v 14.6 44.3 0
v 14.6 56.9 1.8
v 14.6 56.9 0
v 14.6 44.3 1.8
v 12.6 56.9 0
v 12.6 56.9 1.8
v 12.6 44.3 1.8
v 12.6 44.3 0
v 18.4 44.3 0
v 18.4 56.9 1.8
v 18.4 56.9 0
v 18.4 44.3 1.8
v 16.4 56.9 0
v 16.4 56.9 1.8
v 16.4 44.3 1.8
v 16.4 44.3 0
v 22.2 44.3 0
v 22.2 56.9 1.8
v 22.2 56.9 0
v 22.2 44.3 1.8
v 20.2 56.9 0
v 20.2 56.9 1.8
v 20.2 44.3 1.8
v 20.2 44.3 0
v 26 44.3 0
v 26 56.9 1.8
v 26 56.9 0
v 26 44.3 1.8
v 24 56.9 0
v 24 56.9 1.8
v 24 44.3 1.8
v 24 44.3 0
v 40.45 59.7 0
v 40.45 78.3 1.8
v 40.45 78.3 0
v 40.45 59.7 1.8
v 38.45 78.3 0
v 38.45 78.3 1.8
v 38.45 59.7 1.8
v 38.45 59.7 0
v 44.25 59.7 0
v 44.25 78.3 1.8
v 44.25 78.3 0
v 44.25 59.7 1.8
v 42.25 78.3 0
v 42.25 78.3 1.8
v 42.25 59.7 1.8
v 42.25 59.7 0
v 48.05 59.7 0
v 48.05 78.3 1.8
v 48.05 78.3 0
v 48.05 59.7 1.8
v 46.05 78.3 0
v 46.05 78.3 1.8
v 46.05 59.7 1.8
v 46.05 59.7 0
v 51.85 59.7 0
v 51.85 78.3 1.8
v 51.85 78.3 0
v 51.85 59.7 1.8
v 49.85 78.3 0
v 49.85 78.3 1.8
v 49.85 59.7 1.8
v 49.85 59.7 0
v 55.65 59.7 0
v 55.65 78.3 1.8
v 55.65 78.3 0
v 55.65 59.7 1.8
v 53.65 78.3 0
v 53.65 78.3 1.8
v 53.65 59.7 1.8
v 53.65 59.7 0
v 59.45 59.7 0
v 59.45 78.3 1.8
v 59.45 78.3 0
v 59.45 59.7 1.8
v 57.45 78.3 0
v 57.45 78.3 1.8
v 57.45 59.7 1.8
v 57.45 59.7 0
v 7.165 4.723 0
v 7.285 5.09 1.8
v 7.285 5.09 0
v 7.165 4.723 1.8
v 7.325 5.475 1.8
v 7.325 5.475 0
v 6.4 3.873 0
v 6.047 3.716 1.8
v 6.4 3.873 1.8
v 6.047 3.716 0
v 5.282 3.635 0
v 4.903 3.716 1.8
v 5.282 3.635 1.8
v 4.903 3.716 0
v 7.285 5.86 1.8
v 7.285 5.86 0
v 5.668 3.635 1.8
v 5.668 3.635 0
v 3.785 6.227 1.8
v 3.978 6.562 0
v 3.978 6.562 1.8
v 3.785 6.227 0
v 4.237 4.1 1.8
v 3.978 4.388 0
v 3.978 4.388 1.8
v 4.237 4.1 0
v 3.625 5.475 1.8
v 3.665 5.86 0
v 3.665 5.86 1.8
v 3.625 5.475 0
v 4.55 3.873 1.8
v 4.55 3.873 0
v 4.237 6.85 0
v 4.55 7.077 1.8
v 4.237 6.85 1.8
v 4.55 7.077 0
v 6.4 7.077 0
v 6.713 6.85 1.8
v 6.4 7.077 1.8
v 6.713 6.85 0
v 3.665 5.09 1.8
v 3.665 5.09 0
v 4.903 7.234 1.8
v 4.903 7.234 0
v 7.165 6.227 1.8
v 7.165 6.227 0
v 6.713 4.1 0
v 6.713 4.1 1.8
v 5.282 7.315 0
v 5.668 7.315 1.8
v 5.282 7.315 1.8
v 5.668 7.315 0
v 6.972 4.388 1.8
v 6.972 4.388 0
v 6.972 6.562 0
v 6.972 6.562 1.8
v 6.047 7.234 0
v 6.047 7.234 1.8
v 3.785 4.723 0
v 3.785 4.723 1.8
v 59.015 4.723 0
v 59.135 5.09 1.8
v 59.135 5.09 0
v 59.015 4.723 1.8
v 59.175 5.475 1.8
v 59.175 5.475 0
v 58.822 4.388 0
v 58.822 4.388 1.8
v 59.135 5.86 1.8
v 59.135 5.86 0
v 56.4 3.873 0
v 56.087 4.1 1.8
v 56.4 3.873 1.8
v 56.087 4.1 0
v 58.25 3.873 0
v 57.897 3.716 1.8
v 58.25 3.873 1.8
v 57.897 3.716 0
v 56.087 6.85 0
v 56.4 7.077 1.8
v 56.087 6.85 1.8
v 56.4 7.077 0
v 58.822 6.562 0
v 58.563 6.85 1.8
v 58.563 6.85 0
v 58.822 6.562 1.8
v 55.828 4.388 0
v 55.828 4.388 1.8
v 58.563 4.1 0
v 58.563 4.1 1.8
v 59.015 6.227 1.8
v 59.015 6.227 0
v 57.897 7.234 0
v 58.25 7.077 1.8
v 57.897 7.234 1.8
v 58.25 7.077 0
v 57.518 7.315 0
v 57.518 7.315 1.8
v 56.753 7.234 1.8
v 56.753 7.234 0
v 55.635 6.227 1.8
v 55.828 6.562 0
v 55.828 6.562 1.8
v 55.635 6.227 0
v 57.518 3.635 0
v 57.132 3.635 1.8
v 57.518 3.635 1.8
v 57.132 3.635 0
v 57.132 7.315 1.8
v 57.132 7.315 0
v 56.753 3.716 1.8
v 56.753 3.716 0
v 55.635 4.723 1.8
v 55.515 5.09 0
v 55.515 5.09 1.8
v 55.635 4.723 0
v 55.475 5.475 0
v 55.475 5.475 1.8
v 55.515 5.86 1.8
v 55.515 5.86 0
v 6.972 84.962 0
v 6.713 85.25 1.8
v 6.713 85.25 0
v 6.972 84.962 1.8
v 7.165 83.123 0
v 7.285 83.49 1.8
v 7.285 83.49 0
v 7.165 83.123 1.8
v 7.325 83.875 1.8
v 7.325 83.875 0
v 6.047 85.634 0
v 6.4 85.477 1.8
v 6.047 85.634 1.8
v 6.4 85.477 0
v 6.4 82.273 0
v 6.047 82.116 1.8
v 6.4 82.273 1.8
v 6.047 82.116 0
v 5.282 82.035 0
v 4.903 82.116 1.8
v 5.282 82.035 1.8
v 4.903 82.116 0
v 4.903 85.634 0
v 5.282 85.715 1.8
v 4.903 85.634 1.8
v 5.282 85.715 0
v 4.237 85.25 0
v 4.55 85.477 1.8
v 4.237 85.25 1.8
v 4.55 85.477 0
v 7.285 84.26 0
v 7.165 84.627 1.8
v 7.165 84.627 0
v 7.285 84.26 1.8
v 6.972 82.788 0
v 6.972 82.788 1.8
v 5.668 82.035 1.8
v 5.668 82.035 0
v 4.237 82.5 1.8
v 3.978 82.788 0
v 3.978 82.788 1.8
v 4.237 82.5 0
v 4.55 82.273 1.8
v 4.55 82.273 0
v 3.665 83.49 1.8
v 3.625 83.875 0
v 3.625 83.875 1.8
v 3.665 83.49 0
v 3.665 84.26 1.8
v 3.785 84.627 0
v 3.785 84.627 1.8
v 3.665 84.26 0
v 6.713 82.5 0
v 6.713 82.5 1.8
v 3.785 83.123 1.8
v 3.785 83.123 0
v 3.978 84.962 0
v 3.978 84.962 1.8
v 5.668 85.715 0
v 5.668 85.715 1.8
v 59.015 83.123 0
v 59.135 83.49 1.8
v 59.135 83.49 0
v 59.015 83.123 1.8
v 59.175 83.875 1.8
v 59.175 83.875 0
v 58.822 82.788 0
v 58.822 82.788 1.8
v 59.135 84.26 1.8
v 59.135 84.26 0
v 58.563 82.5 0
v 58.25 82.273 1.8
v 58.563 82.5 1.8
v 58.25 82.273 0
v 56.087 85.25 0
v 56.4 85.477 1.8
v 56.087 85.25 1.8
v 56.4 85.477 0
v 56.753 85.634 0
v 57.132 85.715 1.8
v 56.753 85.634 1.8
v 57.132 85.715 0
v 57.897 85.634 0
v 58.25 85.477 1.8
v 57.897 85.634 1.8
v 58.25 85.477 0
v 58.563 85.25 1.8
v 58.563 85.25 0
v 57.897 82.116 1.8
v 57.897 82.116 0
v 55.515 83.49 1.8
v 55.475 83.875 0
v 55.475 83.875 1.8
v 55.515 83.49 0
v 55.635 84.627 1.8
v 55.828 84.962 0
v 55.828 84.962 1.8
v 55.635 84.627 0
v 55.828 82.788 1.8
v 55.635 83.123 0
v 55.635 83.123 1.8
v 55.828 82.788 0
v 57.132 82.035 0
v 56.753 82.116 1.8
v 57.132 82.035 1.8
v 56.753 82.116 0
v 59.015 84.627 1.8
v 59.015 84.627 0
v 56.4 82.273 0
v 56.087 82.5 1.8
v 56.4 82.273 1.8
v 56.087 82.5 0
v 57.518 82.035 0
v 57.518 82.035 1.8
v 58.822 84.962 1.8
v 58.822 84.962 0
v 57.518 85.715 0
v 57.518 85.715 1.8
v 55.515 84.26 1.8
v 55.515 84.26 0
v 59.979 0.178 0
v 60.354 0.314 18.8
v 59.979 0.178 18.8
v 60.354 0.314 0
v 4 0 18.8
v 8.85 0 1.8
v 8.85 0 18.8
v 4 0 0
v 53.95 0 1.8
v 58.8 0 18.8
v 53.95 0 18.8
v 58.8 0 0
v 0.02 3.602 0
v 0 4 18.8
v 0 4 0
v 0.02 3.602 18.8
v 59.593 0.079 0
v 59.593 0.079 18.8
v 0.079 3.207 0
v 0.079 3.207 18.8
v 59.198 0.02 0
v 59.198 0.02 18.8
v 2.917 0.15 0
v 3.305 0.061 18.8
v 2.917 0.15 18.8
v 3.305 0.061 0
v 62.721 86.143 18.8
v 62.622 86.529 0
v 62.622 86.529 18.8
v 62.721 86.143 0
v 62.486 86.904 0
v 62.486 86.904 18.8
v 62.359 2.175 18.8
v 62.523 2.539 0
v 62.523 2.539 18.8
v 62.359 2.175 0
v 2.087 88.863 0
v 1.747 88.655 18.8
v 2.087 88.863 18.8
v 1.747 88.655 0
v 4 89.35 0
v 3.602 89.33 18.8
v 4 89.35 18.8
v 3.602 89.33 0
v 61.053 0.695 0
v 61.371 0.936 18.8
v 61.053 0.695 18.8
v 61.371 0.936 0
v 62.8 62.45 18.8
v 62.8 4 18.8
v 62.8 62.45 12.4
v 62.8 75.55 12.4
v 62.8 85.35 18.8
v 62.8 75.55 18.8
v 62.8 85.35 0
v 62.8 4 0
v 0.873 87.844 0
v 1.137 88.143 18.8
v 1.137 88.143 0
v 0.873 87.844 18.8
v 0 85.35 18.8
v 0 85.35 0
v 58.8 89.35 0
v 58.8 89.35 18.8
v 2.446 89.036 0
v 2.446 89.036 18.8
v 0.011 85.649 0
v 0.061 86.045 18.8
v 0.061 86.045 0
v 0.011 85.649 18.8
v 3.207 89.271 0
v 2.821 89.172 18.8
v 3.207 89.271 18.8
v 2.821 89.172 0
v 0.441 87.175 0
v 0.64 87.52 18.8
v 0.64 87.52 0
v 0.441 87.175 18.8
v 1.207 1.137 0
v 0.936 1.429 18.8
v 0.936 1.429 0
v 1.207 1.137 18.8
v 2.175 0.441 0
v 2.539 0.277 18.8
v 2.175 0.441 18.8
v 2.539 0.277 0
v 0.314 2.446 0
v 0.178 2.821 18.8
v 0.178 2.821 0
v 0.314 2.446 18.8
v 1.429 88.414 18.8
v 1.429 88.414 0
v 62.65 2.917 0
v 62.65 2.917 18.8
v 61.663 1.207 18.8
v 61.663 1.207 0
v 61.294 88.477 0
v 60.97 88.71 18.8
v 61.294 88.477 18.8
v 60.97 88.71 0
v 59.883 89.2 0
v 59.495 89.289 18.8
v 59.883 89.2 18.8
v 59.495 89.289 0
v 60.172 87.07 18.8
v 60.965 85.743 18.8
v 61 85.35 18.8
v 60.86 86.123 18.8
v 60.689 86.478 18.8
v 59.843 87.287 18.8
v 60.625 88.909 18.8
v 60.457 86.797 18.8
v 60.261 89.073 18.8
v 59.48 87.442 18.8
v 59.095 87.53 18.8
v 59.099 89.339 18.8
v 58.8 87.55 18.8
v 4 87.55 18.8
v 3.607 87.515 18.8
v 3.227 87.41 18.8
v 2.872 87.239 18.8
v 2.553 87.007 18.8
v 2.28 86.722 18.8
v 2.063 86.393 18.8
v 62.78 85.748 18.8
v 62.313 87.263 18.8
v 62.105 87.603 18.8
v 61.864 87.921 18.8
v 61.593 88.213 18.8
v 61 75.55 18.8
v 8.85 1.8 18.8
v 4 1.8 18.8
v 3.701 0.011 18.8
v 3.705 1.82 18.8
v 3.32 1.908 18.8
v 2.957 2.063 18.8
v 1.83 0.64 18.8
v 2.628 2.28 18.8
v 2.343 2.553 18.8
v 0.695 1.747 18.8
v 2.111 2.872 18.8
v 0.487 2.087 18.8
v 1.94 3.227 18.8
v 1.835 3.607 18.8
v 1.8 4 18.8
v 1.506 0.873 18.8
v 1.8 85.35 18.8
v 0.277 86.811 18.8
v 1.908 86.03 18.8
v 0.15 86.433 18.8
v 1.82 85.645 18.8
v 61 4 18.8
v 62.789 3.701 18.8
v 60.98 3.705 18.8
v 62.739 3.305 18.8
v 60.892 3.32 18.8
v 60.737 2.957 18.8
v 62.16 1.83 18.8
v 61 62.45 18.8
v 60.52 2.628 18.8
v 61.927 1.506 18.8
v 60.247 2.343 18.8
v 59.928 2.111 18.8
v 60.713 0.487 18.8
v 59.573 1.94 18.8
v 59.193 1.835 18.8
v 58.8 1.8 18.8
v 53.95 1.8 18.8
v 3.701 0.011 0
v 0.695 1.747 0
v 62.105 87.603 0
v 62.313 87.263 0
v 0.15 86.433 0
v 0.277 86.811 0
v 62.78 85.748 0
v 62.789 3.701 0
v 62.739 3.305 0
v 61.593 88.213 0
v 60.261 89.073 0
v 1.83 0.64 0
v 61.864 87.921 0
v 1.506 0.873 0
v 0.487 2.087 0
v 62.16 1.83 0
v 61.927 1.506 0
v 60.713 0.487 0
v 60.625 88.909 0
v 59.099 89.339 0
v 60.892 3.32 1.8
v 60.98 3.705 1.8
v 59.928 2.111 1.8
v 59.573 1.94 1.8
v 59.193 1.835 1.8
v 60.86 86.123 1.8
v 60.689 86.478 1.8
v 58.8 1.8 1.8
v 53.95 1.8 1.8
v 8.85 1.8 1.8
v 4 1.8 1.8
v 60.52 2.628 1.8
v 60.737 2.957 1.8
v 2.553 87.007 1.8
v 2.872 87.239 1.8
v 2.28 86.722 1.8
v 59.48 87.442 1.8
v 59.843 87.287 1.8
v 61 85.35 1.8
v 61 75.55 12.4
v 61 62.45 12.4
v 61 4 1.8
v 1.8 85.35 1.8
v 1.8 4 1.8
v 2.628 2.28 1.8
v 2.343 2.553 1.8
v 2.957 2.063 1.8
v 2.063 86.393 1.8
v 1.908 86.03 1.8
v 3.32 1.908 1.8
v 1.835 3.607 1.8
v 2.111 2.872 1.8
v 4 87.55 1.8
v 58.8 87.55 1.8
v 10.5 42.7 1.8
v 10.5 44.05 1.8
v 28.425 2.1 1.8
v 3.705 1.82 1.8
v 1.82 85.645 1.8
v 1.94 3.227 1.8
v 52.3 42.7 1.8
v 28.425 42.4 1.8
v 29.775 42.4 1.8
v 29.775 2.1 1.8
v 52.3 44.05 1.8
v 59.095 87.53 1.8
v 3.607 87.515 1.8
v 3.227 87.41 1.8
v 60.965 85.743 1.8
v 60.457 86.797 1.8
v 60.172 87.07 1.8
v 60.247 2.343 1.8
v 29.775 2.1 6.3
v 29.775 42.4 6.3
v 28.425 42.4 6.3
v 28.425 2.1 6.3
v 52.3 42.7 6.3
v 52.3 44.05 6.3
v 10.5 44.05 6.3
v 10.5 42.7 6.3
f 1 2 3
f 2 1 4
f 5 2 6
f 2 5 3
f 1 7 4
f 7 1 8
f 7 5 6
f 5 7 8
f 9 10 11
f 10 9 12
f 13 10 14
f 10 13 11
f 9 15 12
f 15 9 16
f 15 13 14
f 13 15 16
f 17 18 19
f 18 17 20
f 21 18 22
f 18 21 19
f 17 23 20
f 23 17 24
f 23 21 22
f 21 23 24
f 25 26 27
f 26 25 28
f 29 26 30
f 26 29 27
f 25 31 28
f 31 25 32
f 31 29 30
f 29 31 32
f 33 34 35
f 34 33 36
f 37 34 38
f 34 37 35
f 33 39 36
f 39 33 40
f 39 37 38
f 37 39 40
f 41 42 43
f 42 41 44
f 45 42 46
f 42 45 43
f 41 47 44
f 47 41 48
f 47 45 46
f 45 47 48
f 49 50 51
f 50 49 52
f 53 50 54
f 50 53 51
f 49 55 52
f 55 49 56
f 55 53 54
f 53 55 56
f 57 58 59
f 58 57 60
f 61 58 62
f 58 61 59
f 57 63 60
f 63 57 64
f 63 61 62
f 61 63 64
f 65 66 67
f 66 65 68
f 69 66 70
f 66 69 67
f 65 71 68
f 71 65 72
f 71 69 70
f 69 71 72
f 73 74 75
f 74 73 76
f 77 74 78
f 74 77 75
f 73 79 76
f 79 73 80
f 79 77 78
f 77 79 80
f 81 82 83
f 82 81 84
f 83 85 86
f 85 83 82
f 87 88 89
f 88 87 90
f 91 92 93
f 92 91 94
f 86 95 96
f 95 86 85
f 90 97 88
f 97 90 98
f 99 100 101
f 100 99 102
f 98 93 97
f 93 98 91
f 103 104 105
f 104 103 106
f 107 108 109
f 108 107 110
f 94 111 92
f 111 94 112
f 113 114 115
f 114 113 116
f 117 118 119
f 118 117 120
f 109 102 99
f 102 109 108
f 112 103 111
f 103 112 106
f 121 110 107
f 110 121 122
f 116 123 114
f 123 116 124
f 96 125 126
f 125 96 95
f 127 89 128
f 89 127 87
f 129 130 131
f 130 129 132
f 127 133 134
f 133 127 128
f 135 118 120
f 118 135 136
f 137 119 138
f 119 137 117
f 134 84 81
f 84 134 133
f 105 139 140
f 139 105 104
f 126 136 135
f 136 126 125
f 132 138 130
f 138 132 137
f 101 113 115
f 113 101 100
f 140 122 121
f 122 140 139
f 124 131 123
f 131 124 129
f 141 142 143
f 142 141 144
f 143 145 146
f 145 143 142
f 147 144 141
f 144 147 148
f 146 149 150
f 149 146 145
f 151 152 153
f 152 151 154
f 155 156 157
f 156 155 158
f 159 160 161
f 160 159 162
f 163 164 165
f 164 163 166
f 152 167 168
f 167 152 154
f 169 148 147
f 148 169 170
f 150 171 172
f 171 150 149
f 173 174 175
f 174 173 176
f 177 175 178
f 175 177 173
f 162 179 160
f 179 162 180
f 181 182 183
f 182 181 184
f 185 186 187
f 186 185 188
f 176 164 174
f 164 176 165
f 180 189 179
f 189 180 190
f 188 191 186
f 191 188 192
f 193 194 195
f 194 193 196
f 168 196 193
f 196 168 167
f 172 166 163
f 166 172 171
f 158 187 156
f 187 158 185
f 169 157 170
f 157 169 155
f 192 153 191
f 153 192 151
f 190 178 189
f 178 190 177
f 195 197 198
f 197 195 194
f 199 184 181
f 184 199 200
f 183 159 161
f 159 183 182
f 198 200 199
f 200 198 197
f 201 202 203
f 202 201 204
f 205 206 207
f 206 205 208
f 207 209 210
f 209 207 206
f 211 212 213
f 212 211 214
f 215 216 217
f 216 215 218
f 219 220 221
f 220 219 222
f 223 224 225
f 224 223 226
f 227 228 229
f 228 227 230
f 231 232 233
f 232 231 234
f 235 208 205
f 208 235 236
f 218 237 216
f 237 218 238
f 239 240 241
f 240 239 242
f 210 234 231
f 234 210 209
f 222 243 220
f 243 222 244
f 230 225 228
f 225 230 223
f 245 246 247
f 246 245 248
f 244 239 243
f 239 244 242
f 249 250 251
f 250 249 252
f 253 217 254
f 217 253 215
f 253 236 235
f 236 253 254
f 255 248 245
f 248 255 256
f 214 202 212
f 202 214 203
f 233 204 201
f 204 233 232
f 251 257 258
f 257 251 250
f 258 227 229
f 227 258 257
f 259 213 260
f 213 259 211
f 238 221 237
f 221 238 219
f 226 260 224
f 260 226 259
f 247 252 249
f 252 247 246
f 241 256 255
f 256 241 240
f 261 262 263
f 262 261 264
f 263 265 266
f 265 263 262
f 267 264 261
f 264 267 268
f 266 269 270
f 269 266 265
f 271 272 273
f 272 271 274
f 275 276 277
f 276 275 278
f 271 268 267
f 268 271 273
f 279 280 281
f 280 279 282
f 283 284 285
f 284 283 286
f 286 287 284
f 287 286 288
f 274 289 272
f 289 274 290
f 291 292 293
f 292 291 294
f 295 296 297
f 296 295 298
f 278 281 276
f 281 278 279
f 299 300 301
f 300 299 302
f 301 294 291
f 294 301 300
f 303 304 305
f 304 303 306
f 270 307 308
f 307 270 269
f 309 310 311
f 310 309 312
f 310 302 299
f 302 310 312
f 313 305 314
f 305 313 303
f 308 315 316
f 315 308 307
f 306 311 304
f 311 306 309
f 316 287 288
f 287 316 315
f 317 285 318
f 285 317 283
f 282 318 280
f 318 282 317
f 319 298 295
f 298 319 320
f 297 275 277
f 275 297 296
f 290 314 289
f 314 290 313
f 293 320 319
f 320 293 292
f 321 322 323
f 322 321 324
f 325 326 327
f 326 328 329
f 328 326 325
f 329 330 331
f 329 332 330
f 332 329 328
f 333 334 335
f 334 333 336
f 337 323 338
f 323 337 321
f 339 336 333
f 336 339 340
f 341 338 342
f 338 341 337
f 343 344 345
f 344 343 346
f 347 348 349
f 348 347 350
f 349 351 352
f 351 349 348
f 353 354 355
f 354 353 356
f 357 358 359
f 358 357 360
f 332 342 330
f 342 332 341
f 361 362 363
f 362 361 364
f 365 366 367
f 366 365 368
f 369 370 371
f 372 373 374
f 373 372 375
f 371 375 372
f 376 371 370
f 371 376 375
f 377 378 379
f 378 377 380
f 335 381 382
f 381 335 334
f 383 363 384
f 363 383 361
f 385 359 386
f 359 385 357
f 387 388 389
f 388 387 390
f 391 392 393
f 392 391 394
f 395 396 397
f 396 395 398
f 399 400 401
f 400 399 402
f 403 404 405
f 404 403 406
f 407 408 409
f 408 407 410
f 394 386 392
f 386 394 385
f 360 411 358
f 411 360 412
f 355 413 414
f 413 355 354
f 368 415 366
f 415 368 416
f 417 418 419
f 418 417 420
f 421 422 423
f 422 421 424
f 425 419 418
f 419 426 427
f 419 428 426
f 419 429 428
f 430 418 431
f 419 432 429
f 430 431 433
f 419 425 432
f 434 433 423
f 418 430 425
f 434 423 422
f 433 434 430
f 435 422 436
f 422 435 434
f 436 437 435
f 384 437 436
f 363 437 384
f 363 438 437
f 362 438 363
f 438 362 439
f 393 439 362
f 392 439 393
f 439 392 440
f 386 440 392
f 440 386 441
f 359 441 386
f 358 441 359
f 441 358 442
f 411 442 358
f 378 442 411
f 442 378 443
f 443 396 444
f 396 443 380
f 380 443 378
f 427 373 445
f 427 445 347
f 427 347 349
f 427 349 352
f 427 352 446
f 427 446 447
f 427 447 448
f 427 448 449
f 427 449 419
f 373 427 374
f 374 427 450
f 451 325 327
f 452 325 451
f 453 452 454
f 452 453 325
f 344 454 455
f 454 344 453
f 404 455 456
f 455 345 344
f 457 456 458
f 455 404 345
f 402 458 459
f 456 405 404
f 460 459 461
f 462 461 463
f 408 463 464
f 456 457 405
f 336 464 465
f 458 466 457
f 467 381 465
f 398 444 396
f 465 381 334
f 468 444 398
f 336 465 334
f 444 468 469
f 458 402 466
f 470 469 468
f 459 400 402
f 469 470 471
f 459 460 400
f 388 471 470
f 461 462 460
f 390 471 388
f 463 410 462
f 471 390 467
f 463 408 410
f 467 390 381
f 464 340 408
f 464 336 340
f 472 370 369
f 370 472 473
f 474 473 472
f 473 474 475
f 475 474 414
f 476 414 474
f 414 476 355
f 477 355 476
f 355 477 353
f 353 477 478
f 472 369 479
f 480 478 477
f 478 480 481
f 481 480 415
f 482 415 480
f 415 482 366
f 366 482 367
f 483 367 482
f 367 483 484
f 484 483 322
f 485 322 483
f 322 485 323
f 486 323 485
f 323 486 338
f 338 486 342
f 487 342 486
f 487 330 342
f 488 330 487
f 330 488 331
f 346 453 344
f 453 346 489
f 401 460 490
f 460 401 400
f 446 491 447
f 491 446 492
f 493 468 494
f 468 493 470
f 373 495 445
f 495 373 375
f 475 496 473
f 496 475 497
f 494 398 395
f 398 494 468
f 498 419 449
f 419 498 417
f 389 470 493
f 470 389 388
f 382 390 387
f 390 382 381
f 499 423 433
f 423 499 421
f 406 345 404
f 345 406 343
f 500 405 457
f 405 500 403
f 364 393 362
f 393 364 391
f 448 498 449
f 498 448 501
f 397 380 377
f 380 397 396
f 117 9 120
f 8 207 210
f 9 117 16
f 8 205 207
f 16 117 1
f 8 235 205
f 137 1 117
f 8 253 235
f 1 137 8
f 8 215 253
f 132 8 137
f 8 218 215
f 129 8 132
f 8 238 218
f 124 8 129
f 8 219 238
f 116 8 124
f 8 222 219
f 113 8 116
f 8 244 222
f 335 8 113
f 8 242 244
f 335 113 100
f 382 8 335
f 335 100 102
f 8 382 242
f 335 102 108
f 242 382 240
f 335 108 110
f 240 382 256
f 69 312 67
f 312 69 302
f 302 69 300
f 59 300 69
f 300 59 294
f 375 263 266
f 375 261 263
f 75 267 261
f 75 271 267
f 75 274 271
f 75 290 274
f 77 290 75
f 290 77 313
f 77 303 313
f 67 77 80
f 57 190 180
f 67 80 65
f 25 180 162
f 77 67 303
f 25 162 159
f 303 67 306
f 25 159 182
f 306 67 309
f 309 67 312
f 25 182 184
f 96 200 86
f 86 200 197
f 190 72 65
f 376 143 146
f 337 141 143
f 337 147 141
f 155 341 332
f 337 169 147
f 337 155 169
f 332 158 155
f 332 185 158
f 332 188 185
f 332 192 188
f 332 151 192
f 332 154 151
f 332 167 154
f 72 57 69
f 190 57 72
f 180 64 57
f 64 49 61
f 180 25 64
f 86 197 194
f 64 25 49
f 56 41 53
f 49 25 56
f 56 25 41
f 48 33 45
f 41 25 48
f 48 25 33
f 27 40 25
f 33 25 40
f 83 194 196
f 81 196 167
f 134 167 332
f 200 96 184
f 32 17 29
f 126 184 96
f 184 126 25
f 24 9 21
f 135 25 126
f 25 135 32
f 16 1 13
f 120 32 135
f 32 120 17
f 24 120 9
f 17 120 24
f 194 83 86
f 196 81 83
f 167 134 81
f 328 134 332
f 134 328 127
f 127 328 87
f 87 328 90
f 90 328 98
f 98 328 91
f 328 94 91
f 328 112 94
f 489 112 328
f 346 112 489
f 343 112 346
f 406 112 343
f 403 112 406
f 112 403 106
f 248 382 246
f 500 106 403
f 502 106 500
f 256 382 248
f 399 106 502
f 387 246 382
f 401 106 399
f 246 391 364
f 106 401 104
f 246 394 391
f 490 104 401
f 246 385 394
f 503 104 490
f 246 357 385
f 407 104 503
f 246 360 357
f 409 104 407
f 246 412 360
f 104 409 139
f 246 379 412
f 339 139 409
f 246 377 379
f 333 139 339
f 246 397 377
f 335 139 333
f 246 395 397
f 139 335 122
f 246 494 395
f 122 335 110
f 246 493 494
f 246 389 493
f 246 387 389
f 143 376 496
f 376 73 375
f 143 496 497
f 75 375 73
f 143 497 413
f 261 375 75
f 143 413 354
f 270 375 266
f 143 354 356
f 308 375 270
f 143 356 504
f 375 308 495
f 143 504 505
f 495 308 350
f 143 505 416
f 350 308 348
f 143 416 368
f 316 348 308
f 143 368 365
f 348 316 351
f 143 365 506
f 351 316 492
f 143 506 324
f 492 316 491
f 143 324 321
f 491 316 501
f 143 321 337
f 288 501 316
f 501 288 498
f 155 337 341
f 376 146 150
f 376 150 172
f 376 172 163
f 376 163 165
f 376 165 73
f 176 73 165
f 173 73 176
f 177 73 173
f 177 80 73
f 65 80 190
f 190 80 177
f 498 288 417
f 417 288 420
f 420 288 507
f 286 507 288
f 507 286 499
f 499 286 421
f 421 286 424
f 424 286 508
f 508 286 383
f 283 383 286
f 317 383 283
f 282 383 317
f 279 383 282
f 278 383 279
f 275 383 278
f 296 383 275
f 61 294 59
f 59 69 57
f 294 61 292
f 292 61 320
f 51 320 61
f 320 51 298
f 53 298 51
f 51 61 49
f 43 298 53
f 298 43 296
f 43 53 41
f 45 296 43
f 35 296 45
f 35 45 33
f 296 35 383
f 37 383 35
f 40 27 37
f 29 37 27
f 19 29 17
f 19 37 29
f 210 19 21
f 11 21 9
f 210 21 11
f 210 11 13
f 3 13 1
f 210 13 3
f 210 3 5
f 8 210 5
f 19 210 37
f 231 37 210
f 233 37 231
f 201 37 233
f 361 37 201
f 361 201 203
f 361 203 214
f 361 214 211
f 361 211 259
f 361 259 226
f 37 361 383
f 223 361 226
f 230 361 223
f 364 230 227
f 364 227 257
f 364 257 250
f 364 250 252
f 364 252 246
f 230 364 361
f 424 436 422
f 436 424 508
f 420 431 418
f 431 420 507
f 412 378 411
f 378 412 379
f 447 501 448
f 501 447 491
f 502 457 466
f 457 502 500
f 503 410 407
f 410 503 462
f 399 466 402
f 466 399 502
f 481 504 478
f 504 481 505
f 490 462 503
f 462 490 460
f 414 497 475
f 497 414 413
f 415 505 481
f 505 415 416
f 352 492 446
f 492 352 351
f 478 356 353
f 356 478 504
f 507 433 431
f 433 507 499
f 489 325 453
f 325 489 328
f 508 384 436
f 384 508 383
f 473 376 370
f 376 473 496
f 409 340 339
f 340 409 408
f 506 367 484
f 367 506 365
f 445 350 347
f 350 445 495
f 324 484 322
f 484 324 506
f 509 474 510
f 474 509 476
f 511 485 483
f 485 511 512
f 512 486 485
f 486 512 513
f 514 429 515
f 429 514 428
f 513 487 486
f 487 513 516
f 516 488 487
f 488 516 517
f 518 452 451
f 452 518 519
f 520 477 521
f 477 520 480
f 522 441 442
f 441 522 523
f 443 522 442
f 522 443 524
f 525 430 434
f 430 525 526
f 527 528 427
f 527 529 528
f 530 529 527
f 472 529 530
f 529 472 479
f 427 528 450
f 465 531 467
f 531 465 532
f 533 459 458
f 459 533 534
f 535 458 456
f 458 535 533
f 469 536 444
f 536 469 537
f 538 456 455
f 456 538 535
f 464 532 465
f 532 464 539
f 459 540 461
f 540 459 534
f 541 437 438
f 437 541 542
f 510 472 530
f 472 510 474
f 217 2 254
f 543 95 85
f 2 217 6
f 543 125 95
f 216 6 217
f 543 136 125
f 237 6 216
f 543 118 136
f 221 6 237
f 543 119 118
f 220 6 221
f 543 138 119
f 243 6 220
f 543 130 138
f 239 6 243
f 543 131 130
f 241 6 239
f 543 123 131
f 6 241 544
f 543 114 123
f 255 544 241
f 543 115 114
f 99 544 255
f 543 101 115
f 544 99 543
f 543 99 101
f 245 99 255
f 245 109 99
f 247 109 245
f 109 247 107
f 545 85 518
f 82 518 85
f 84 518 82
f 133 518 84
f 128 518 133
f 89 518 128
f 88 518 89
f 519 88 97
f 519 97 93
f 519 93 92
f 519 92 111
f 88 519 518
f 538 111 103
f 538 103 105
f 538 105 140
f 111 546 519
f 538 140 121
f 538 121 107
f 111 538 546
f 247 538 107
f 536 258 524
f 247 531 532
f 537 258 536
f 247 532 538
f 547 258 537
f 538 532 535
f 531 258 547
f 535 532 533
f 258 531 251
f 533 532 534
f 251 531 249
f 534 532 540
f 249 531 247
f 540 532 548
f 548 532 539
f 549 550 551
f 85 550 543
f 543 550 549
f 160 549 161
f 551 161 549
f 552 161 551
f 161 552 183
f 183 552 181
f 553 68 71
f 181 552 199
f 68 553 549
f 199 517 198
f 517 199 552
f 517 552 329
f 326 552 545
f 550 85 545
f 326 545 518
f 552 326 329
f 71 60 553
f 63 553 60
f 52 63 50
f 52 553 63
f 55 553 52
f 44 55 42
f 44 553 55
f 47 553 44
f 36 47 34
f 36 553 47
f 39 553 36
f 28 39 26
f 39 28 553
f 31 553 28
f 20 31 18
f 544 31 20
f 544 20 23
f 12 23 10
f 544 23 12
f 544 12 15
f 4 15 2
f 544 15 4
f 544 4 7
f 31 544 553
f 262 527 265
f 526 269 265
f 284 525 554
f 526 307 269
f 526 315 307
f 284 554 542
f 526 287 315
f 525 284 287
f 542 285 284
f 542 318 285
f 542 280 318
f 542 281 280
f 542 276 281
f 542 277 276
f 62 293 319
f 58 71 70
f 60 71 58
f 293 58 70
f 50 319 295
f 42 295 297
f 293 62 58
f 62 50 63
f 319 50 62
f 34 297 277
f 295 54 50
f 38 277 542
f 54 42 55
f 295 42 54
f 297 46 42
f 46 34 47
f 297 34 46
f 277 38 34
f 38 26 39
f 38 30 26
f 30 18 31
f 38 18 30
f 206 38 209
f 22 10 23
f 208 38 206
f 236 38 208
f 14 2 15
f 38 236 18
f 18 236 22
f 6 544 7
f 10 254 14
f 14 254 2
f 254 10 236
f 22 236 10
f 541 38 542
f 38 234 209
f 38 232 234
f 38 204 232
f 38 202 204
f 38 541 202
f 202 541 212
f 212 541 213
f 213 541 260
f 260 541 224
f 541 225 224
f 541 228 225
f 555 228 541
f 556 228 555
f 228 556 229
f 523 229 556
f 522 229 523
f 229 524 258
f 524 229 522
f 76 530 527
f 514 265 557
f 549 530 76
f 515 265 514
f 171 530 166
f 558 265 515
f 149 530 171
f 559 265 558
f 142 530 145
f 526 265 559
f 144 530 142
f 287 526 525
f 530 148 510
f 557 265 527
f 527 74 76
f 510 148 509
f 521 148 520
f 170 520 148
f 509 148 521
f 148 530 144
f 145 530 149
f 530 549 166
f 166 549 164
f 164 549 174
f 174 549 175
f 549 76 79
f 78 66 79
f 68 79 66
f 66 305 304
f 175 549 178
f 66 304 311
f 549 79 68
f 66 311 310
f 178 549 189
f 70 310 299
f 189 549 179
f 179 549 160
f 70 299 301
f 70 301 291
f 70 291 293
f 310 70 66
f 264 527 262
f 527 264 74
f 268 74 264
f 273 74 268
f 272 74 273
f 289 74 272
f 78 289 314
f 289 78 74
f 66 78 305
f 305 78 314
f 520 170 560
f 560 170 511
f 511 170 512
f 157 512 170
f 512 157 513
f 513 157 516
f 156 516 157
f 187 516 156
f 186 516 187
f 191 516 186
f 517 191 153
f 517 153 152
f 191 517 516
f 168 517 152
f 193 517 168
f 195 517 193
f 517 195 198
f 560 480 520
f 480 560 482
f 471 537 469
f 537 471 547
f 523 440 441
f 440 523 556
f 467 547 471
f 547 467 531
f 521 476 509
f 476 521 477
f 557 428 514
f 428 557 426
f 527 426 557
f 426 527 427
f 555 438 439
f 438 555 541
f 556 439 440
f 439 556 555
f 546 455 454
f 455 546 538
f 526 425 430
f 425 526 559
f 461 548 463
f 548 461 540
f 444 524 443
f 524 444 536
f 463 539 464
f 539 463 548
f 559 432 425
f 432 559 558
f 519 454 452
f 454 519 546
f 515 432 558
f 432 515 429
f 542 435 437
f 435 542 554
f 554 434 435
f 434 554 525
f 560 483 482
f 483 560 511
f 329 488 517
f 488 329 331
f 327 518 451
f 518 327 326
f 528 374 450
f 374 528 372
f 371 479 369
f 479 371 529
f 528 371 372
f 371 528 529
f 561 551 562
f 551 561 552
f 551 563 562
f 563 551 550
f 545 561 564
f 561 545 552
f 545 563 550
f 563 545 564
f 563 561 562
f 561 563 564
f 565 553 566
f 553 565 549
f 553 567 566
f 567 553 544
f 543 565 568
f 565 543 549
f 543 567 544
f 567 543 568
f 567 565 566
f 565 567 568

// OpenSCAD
// file: print-chamber-box.params.scad
// SPDX-FileCopyrightText: 2026 Alon A. Rabinowitz
// SPDX-License-Identifier: CC-BY-4.0
// Shared under the Creative Commons Attribution 4.0 International licence
// (LICENSES/CC-BY-4.0.txt): reuse freely, including commercially, with attribution.

/*
Everything you SET for the print-chamber box. Render print-chamber-box.scad, not this file.

The box for the node in firmware/print-chamber.yaml: an SPS30 particle sensor standing on edge with its
air face DOWN, the ESP32-C3 SuperMini above it, and the GY-SGP41 between the two. Why that layout,
with a source for each rule, is in README.md.

COORDINATES are the box as INSTALLED: Y out from the mounting surface, Z up, and X - because the
frame is right-handed - pointing to YOUR LEFT as you face the box. "Left" and "right" in the
comments mean as you face it. The USB-C cable leaves the box on your left.
*/

/* [Which part] */
part = "back";   /* "back", "cover", or "assembly" (preview only - several parts, not printable). */

/* [The SPS30 - sourced from its datasheet v2.0, Figure 7] */
sps_w    = 40.6;   /* Along the air face (X). 40.6 +/- 0.3 without the shipping foil, which can stay on. */
sps_h    = 40.6;   /* The other side of the big face (Z). */
sps_t    = 12.2;   /* Thickness (Y). 12.2 +/- 0.3. */
sps_nub  = 0.3;    /* Each side: the plastic nubs on the side faces make it 41.2 across. */

/* [MEASURE THESE - placeholders until then; see `unmeasured` below] */
divider_from_inlet_end = 18.0;   /* Along the air face, from the INLET end to the middle of the gap before the outlet grille. 18.0 is scaled off the datasheet drawing, not measured. */
outlet_at_left = true;           /* Viewed from the front with the label facing you and the air face down: is the outlet grille at the left end? The connector is at the same end as the outlet (datasheet Figure 7). */
sm_l         = 22.5;   /* SuperMini length, USB-C end to antenna end. */
sm_w         = 18.0;   /* SuperMini width. */
sm_pcb_t     = 1.0;    /* Bare PCB thickness. */
sm_t         = 4.0;    /* PCB plus its tallest component, as populated. */
usb_center_h = 2.6;    /* Height of the USB-C receptacle's centre above the BACK of the PCB. */
wire_perpendicular = true;   /* Does the antenna wire's straight 15 mm stand OUT of the board (true) or run along it, past the antenna end (false)? */
wire_h       = 15.0;   /* How far the antenna wire reaches - above the board, or past its end. */
usb_plug_w   = 12.5;   /* The cable's PLUG BODY, not the receptacle: the opening has to pass the overmould. */
usb_plug_h   = 7.0;
gy_l         = 15.0;   /* GY-SGP41 module. */
gy_w         = 12.0;
gy_t         = 3.0;
cable_zone_h = 10.0;   /* Room above the SPS30's connector face for the plug and the bend in the lead. */

unmeasured = ["divider_from_inlet_end", "outlet_at_left", "sm_l", "sm_w", "sm_pcb_t", "sm_t",
              "usb_center_h", "wire_perpendicular", "wire_h", "usb_plug_w", "usb_plug_h",
              "gy_l", "gy_w", "gy_t", "cable_zone_h"];
/* Delete a name from this list once its value is measured. While any remain, the model echoes a
   WARNING and scripts/scad-check.sh exits 2 - which is the INTENDED state until then. */

/* [Fits - untested in ASA on this printer; see `untested_fits` below] */
sps_fit    = 0.3;    /* Clearance per side around the SPS30. fdm-design-rules records NO house default - this is a placeholder. */
pocket_fit = 0.3;    /* Clearance per side around the two boards. */
part_fit   = 0.3;    /* Clearance between a back-plate feature and the cover. */
pilot_d    = 2.5;    /* Pilot hole for the M3 x 14 self-tapping screws that close the cover. */
screw_d    = 3.4;    /* Clearance hole for those screws in the cover. */
tab_hole_d = 4.0;    /* Mounting holes in the tabs, for wood screws up to 3.5 mm. */

untested_fits = ["sps_fit", "pocket_fit", "part_fit", "pilot_d", "screw_d", "tab_hole_d"];
/* ASA shrinks more than PETG, and holes print undersize. Print a clearance ladder before the box, then
   clear this list. */

/* [Walls - widths in beads of fdm_extrusion_w, thicknesses in layers of fdm_layer_h] */
wall      = 1.8;    /* Side, top and bottom walls of the cover: 4 beads. */
back_t    = 2.4;    /* The back plate, printed flat: 12 layers. Carries the mounting tabs. */
front_t   = 1.8;    /* The cover's front, printed flat on the bed: 9 layers. */
cradle_t  = 1.35;   /* The walls of the channel the SPS30 slides into: 3 beads. */
divider_t = 1.35;   /* The divider between the inlet and outlet sides: 3 beads. */
rib_t     = 1.35;   /* The cover's internal ribs: 3 beads. */
rim_t     = 0.9;    /* The rims that locate the two boards: 2 beads. */

/* [Airflow] */
divider_proud = 4.0;   /* How far the divider stands below the box, so the outlet's stream cannot loop straight back to the inlets. */
front_gap_min = 2.5;   /* Least air gap in front of the SPS30's label face - one inlet wraps round onto that face. */
vent_w        = 2.0;   /* Width of each vent slot. */
vent_rib      = 1.8;   /* Material between vent slots: 4 beads. */

/* [Holding the sensor] */
lip    = 1.0;   /* How far the channel's front lips overlap the SPS30's front face. */
ledge  = 1.0;   /* How far the ledges reach under each end of the air face. Must stay clear of the openings. */

/* [Mounting and closing] */
tab_l     = 14.0;   /* How far each mounting tab reaches beyond the box. Long enough that the screwdriver's shaft clears the box's side wall: the hole sits tab_w/2 from the tab's end. */
tab_w     = 12.0;   /* Height of each tab. */
boss_d    = 6.75;   /* The cover-screw bosses. */
corner_r  = 4.0;    /* Plan-view corner radius. ASA lifts at sharp corners; a radius is the permanent cure (fdm-design-rules §5b). */
gap       = 1.0;    /* General clearance between internal features. */

/* [Print reality - cross-checked by scripts/scad-check.sh against the profile used] */
fdm_layer_h     = 0.2;
fdm_extrusion_w = 0.45;
fdm_hole_comp   = 0.15;   /* Added to every hole's radius - fdm-design-rules §2. Not cross-checked. */

/* Opened on its own, this file draws nothing - it only holds numbers. */
if (is_undef(draw_model))
    echo("THIS IS THE SETTINGS FILE - numbers only, so the view stays empty. Open print-chamber-box.scad to see the model.");
// main file
// SPDX-FileCopyrightText: 2026 Alon A. Rabinowitz
// SPDX-License-Identifier: CC-BY-4.0
// Shared under the Creative Commons Attribution 4.0 International licence
// (LICENSES/CC-BY-4.0.txt): reuse freely, including commercially, with attribution.

// The cover, on its own, for scripts/scad-check.sh. Everything is in print-chamber-box.scad; this only
// picks the part. Assigning `part` after the include replaces it silently - that is the idiom, not a
// mistake (docs/openscad-basics, lesson 3 §7).
include <print-chamber-box.scad>
part = "cover";
